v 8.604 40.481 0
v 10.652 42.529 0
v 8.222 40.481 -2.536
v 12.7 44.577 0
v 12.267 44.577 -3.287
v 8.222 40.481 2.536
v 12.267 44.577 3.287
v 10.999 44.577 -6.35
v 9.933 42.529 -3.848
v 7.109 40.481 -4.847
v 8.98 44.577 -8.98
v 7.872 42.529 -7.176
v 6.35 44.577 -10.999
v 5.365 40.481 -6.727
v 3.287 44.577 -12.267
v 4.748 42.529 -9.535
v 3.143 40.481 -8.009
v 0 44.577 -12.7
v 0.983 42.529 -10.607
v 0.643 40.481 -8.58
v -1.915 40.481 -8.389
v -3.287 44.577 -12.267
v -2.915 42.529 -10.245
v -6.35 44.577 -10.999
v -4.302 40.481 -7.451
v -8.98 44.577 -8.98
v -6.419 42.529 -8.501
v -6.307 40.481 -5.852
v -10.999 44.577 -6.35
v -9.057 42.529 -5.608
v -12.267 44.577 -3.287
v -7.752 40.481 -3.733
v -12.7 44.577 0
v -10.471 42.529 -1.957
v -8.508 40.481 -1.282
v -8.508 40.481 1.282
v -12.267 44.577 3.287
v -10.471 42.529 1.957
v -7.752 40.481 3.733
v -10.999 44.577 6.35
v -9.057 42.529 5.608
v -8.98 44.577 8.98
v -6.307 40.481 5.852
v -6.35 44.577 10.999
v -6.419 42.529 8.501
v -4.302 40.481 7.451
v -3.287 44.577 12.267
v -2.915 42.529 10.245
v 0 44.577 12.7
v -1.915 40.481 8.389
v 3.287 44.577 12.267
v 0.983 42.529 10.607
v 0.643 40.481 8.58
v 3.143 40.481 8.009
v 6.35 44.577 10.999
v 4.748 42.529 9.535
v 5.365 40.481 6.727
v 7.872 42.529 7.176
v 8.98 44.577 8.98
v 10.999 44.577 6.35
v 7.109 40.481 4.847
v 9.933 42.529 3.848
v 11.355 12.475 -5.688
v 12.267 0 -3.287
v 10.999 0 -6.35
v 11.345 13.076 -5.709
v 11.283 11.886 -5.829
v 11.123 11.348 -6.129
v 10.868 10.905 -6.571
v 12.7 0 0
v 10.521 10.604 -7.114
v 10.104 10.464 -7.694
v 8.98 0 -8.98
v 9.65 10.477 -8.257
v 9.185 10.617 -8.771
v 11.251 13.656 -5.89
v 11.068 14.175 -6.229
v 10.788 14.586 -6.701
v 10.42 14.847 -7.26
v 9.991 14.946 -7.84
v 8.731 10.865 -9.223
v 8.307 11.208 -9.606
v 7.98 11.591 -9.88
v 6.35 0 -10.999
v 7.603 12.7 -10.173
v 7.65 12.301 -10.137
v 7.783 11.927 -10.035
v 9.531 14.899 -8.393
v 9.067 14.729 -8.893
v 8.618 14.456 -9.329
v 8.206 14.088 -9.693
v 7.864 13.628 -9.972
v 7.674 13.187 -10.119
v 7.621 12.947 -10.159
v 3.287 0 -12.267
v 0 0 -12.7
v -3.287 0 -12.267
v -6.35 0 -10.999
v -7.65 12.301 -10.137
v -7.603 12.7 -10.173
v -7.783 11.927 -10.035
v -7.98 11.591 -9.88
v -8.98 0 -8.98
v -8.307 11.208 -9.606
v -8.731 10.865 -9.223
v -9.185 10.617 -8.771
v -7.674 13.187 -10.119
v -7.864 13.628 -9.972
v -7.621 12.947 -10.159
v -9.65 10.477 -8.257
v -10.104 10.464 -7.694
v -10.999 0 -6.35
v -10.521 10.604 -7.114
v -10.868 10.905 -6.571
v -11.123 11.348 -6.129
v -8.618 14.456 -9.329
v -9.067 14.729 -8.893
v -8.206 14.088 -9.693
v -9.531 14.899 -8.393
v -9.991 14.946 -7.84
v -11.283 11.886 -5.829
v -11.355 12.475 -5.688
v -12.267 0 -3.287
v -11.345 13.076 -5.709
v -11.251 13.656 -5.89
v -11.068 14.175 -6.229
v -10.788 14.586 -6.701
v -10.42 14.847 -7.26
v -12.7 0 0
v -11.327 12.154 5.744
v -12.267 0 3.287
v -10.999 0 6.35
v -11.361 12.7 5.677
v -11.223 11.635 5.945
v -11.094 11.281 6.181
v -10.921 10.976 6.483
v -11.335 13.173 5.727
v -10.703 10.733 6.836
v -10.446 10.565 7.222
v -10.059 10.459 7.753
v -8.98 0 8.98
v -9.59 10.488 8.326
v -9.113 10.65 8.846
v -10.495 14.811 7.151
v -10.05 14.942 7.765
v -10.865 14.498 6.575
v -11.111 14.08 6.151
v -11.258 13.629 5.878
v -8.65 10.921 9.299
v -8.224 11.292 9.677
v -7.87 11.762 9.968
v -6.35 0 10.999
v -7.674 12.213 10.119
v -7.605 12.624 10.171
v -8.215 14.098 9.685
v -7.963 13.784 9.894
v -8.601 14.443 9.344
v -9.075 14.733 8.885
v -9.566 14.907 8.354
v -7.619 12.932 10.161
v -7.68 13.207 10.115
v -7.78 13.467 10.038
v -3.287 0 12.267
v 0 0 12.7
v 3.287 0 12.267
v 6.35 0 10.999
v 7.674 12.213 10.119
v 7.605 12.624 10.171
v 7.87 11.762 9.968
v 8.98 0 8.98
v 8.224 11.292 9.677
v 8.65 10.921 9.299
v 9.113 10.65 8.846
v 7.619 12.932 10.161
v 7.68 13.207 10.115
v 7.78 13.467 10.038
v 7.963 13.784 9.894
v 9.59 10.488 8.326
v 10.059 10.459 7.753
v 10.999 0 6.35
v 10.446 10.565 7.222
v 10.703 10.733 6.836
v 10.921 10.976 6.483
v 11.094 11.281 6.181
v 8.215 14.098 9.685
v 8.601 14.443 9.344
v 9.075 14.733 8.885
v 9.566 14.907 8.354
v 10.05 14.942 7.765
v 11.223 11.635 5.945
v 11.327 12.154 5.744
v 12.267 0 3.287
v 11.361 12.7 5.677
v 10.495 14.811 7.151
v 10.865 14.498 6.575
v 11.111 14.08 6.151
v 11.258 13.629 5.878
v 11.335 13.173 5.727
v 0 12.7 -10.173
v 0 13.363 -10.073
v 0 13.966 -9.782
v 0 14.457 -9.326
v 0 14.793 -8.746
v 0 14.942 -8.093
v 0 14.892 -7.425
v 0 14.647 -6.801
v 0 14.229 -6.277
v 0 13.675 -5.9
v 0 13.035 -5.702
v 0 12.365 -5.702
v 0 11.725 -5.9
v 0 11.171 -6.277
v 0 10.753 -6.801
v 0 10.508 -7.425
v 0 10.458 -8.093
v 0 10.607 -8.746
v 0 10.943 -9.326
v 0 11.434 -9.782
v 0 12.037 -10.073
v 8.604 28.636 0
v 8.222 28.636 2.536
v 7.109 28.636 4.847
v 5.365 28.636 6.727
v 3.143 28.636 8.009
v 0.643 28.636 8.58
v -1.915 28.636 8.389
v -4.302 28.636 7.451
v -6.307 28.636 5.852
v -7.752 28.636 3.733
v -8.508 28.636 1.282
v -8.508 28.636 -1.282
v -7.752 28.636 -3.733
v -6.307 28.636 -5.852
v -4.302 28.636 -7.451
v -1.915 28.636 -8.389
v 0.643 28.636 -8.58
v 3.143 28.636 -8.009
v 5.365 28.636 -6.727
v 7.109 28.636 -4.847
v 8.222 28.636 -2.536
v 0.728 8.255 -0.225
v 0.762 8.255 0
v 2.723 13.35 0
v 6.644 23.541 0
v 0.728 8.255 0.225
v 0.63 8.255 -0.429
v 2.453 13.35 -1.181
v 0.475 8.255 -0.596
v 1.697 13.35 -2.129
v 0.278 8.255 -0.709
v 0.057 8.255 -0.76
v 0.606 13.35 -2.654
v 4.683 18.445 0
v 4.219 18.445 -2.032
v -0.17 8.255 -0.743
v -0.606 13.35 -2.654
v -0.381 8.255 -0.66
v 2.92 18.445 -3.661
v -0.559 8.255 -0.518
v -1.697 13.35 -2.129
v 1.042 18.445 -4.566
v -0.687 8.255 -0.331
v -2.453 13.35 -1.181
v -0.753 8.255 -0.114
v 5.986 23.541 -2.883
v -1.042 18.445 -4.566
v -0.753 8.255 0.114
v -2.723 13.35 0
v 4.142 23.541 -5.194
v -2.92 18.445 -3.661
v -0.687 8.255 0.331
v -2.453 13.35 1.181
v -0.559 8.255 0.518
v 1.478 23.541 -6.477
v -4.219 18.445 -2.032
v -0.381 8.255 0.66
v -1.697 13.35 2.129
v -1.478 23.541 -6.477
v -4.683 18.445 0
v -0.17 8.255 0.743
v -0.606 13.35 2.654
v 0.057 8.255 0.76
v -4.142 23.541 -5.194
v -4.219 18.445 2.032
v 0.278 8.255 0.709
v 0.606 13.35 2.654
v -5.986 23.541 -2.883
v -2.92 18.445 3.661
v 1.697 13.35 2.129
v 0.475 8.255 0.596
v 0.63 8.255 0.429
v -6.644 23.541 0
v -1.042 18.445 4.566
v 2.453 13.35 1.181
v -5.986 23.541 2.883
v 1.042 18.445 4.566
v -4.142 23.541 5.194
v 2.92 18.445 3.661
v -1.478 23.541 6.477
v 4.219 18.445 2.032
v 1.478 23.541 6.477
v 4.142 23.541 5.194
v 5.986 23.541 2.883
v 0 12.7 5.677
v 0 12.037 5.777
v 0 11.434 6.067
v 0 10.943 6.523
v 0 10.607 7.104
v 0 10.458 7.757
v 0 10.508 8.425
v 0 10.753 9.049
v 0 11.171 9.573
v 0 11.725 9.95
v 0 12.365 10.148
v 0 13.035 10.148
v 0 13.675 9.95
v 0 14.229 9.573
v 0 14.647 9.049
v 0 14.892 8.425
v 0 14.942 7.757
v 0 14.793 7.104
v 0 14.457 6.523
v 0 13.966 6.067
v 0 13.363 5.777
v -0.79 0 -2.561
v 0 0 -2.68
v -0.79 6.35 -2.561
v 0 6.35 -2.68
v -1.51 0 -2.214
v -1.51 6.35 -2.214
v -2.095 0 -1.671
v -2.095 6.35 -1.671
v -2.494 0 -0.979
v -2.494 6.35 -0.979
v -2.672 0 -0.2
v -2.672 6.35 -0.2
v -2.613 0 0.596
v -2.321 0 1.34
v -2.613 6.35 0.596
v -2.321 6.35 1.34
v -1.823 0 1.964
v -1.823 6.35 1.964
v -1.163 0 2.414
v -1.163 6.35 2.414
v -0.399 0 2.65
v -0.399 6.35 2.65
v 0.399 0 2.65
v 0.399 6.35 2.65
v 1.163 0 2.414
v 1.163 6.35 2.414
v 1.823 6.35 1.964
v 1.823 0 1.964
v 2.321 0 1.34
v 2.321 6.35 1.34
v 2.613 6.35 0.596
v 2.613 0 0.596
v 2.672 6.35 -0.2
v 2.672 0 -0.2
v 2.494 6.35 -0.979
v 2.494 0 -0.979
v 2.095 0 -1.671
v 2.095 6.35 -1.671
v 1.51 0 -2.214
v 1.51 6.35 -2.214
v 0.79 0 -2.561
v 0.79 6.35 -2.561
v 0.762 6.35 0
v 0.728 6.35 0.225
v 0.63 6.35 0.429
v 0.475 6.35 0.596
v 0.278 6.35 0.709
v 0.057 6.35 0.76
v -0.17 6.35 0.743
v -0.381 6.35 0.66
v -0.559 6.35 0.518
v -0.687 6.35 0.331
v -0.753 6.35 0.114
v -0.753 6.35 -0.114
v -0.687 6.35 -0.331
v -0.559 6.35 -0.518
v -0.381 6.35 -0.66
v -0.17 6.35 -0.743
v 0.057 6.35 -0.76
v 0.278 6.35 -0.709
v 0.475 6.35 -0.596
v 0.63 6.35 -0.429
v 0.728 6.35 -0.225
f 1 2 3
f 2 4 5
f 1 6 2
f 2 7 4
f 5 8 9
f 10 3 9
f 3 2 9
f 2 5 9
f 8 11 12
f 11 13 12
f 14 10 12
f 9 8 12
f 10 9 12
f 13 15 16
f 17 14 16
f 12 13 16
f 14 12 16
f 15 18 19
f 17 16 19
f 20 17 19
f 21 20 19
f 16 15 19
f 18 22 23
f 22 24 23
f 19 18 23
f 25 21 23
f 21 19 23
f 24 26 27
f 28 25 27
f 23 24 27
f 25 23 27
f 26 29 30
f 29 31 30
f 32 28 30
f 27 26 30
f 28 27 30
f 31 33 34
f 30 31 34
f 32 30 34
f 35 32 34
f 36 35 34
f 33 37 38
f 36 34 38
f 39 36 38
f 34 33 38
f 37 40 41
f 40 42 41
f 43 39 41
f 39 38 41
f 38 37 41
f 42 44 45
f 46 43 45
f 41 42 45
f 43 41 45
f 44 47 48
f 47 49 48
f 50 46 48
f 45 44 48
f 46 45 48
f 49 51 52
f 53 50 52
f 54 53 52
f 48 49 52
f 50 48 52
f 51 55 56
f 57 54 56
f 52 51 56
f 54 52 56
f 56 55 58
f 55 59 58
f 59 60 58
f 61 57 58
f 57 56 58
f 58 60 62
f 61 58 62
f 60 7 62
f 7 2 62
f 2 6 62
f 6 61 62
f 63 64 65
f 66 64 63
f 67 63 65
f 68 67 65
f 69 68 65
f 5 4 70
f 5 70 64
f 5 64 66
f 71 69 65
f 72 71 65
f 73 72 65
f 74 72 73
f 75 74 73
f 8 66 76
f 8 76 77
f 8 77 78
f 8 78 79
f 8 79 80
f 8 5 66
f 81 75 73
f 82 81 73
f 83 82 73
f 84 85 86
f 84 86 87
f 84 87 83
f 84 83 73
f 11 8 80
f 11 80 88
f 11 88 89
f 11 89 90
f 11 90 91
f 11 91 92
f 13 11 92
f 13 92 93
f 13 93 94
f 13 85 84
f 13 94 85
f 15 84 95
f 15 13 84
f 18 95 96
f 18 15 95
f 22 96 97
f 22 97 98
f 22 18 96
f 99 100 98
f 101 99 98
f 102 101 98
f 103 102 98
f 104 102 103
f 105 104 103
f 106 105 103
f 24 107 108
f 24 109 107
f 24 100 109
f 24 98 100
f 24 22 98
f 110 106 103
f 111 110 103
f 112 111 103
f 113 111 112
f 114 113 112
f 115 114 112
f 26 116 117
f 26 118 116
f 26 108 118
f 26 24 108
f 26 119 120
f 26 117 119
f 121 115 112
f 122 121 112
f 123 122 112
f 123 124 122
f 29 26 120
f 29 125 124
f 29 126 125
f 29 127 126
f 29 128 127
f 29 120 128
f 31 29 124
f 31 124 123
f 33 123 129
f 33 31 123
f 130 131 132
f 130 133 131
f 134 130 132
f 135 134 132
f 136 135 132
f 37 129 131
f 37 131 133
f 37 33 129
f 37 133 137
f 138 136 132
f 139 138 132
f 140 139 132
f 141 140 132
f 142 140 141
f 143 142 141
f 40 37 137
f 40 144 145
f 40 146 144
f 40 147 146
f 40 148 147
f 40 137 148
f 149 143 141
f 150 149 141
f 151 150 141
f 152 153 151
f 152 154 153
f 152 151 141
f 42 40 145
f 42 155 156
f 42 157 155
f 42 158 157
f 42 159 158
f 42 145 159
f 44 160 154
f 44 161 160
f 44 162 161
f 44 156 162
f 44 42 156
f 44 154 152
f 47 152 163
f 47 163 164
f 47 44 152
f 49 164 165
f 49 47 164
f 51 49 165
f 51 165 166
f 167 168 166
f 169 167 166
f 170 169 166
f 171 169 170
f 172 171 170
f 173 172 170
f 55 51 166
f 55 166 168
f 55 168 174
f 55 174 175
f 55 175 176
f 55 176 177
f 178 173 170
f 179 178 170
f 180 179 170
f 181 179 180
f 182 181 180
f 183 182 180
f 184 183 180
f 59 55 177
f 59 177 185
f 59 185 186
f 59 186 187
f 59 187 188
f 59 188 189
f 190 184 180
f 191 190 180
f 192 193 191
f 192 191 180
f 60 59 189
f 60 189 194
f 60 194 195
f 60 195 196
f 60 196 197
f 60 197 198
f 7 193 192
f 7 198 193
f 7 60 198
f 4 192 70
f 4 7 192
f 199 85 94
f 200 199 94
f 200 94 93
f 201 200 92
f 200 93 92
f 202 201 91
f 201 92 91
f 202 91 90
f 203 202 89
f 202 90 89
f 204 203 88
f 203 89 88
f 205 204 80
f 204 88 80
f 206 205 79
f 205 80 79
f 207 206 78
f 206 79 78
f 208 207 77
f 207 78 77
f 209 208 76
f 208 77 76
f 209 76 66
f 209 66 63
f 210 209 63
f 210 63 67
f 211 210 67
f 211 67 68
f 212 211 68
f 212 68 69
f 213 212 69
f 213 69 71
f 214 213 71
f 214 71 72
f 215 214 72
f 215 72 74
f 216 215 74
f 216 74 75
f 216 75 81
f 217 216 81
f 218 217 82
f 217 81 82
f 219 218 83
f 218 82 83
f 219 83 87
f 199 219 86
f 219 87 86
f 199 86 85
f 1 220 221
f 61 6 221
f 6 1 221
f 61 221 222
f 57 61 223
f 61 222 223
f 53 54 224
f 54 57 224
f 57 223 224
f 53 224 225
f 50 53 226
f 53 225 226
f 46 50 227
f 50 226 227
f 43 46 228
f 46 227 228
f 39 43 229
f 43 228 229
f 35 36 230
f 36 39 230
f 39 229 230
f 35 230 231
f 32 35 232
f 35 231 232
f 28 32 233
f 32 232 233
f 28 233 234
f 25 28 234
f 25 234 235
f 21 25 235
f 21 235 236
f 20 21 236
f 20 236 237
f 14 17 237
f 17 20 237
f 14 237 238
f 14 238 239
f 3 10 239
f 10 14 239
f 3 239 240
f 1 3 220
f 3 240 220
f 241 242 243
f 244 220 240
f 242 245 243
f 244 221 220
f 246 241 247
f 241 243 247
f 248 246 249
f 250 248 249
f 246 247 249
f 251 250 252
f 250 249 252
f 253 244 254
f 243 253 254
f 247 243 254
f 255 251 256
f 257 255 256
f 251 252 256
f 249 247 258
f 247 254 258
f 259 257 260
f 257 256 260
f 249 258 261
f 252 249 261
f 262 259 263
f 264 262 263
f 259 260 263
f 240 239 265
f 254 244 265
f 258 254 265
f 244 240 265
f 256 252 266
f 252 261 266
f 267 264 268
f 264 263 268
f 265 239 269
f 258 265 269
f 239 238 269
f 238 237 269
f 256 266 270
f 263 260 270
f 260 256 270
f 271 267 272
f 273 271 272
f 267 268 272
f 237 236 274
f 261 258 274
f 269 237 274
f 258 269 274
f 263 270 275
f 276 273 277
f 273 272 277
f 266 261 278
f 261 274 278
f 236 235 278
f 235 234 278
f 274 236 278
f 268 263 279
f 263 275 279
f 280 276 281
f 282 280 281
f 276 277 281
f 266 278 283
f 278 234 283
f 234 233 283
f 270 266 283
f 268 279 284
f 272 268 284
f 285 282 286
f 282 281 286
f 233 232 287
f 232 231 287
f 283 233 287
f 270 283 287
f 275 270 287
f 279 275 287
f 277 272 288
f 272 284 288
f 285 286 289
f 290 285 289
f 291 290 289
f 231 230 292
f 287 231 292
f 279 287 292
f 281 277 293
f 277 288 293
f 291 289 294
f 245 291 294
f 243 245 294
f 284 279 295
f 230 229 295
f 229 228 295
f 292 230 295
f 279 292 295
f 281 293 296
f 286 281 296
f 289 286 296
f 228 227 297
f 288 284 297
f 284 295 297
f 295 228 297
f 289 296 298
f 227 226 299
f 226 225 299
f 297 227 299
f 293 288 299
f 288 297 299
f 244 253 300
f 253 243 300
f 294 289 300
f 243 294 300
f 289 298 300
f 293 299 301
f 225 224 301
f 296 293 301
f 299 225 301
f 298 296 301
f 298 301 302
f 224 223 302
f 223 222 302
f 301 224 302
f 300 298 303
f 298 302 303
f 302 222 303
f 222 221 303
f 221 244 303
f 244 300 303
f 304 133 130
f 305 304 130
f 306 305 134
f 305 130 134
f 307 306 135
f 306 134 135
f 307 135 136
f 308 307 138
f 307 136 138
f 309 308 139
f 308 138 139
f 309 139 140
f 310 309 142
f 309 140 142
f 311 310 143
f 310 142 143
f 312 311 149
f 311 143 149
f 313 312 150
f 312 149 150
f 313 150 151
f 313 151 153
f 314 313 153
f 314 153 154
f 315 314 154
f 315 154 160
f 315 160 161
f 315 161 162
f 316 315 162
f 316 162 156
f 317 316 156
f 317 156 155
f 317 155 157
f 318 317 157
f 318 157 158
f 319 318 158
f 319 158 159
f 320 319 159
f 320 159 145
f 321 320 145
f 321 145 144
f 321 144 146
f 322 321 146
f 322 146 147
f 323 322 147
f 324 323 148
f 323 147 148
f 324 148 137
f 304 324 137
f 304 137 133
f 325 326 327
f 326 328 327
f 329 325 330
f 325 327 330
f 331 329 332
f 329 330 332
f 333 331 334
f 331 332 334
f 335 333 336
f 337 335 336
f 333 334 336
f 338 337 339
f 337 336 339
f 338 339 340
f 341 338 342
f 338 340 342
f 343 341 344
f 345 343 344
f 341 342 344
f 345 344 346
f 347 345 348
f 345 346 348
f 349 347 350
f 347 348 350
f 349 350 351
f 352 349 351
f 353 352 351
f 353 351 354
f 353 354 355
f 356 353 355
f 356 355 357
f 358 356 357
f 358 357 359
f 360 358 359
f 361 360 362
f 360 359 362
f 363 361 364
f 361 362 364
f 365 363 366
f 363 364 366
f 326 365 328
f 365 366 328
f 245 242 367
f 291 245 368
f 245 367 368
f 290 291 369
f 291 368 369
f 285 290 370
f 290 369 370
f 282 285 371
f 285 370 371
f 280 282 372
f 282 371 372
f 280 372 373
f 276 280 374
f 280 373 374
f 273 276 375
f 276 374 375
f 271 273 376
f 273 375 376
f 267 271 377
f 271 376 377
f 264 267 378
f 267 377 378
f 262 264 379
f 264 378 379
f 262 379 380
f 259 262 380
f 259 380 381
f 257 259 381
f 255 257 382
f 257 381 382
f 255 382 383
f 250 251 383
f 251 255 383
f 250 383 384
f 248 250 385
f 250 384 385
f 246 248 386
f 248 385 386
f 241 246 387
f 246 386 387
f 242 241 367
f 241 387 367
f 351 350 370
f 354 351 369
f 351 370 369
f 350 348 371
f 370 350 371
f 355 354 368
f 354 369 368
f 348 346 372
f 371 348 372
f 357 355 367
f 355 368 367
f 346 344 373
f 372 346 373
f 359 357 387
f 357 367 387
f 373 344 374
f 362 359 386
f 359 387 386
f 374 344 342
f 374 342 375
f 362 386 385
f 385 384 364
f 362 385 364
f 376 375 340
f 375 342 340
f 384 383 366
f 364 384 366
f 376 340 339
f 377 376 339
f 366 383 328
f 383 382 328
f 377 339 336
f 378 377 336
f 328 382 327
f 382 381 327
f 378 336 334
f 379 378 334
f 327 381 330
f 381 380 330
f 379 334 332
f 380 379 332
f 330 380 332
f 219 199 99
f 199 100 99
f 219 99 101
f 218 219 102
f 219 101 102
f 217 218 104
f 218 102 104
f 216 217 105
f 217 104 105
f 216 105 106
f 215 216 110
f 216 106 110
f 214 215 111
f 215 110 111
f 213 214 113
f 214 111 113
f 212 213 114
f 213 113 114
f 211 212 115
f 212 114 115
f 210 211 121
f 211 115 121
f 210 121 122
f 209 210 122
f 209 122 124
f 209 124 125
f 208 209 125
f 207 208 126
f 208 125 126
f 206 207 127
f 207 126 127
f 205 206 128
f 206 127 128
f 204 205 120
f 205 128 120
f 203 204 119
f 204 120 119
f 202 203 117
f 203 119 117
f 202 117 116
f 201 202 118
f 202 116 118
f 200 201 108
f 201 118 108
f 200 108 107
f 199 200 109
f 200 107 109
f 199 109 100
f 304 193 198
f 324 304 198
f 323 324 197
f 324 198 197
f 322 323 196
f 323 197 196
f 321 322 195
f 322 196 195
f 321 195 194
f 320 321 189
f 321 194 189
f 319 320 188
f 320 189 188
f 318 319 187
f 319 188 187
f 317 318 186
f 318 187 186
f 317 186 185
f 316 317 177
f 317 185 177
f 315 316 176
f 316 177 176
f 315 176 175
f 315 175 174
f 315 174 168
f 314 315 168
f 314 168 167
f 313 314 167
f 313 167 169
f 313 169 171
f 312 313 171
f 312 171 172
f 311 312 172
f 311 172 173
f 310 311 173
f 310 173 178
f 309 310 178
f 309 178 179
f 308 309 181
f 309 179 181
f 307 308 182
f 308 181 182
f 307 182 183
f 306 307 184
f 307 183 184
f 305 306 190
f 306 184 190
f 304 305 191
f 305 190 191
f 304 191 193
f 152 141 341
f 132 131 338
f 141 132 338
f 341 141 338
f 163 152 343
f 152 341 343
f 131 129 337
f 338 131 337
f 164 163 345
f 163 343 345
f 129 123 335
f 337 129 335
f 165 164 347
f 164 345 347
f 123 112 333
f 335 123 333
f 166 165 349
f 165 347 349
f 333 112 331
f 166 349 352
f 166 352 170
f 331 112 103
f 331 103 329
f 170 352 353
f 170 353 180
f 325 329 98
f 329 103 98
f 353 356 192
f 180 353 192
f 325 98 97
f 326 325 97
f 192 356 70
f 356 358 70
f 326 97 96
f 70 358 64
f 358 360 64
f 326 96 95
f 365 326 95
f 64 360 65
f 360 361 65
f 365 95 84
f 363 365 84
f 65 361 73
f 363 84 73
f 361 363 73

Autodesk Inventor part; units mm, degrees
ref_plane "YZ Plane" through (0, 0, 0) normal (1, 0, 0) x (0, 1, 0)
ref_plane "XZ Plane" through (0, 0, 0) normal (0, 1, 0) x (-1, 0, 0)
ref_plane "XY Plane" through (0, 0, 0) normal (0, 0, 1) x (1, 0, 0)
sketch "Sketch1" plane through (0, 0, 0) normal (0, 0, 1) x (1, 0, 0)
  line L0 (0, 0) -> (6.223, 0)
  line L1 (0, 0) -> (6.223, 0) construction
  line L2 (6.223, 0) -> (6.223, 38.1)
  line L3 (0, 0) -> (0.762, 0)
  line L4 (0.762, 0) -> (0.762, 8.255)
  line L5 (0.762, 8.255) -> (6.223, 28.635729)
  line L6 (6.223, 28.635729) -> (6.223, 38.1)
  line L7 (0, 0) -> (12.7, 0)
  line L8 (0, -8.9154) -> (0, 53.4924)
  line L9 (6.223, 38.1) -> (12.20332, 44.08032)
  line L10 (6.223, 38.1) -> (14.68045, 38.1) construction
  line L11 (12.20332, 44.08032) -> (12.7, 0)
  line L12 (12.7, 0) -> (12.7, 44.577)
  line L13 (12.7, 44.577) -> (6.223, 38.1)
  line L14 (6.223, 38.1) -> (0, 38.1)
  line L15 (0, 8.255) -> (0.762, 8.255)
  line L16 (0, 8.255) -> (0, 38.1)
  line L17 (6.223, 28.635729) -> (0, 28.635729)
  line L18 (0, 28.635729) -> (8.60425, 28.635729)
  line L19 (8.60425, 28.635729) -> (0.762, 8.255)
  line L20 (8.60425, 28.635729) -> (8.60425, 40.48125)
  dimension "d0" = 6.223
  dimension "d1" = 0
  dimension "d2" = 38.1
  dimension "d3" = 90
  dimension "d4" = 0.762
  dimension "d5" = 8.255
  dimension "d6" = 165
  dimension "d7" = 12.7
  dimension "d18" = 45
  dimension "d58" = 8.60425
sketch "Sketch1 outline for Revolution1" plane through (0, 0, 0) normal (0, 0, 1) x (1, 0, 0)
  line L0 (8.60425, 40.48125) -> (8.60425, 28.635729)
  line L1 (8.60425, 28.635729) -> (0.762, 8.255)
  line L2 (0.762, 8.255) -> (0.762, 0)
  line L3 (0.762, 0) -> (12.7, 0)
  line L4 (12.7, 0) -> (12.7, 44.577)
  line L5 (12.7, 44.577) -> (8.60425, 40.48125)
revolve "Revolution1" add sketch "Sketch1 outline for Revolution1" angle 360 about axis through (0, -10, 0) along (0, 1, 0)
sketch "Sketch3" plane through (0, 0, 0) normal (0, -1, 0) x (1, 0, 0)
  point P0 (0, 0)
  point P1 (0, 0)
hole "Hole2" at (0, 0, 0) direction (0, 1, 0) diameter 5.3594 depth 6.35 thread size "1/4-28 UNF" class "2B" standard "ANSI Unified Screw Threads"
sketch "Sketch4" plane through (0, 0, 0) normal (1, 0, 0) x (0, 1, 0)
  line L0 (0, 12.7) -> (0, -12.7) projected
  line L1 (0, 12.7) -> (0, 7.9248)
  line L2 (0, 7.9248) -> (12.7, 7.9248)
  line L3 (0, -12.7) -> (0, -7.9248)
  line L4 (0, -7.9248) -> (12.7, -7.9248)
  point P0 (0, 0)
  dimension "d28" = 4.7752
  dimension "d29" = 12.7
  dimension "d30" = 4.7752
  dimension "d31" = 12.7
  dimension "d32" = 90
hole "Hole3" at (0, 12.7, 7.9248) at (0, 12.7, -7.9248) direction (-1, 0, 0) diameter 4.4958 end through all clearance for "Socket Head Cap Screw" size "#8" standard "Ansi Unified Screw Threads"
mirror "Mirror1" about plane through (0, 0, 0) normal (1, 0, 0) of "Hole3"
equation "\"d47\" = 55deg"
equation "\"Sketch5_Pitch\" = 0.90714"
properties part number "catch vertical seal-tighttol-thread"
